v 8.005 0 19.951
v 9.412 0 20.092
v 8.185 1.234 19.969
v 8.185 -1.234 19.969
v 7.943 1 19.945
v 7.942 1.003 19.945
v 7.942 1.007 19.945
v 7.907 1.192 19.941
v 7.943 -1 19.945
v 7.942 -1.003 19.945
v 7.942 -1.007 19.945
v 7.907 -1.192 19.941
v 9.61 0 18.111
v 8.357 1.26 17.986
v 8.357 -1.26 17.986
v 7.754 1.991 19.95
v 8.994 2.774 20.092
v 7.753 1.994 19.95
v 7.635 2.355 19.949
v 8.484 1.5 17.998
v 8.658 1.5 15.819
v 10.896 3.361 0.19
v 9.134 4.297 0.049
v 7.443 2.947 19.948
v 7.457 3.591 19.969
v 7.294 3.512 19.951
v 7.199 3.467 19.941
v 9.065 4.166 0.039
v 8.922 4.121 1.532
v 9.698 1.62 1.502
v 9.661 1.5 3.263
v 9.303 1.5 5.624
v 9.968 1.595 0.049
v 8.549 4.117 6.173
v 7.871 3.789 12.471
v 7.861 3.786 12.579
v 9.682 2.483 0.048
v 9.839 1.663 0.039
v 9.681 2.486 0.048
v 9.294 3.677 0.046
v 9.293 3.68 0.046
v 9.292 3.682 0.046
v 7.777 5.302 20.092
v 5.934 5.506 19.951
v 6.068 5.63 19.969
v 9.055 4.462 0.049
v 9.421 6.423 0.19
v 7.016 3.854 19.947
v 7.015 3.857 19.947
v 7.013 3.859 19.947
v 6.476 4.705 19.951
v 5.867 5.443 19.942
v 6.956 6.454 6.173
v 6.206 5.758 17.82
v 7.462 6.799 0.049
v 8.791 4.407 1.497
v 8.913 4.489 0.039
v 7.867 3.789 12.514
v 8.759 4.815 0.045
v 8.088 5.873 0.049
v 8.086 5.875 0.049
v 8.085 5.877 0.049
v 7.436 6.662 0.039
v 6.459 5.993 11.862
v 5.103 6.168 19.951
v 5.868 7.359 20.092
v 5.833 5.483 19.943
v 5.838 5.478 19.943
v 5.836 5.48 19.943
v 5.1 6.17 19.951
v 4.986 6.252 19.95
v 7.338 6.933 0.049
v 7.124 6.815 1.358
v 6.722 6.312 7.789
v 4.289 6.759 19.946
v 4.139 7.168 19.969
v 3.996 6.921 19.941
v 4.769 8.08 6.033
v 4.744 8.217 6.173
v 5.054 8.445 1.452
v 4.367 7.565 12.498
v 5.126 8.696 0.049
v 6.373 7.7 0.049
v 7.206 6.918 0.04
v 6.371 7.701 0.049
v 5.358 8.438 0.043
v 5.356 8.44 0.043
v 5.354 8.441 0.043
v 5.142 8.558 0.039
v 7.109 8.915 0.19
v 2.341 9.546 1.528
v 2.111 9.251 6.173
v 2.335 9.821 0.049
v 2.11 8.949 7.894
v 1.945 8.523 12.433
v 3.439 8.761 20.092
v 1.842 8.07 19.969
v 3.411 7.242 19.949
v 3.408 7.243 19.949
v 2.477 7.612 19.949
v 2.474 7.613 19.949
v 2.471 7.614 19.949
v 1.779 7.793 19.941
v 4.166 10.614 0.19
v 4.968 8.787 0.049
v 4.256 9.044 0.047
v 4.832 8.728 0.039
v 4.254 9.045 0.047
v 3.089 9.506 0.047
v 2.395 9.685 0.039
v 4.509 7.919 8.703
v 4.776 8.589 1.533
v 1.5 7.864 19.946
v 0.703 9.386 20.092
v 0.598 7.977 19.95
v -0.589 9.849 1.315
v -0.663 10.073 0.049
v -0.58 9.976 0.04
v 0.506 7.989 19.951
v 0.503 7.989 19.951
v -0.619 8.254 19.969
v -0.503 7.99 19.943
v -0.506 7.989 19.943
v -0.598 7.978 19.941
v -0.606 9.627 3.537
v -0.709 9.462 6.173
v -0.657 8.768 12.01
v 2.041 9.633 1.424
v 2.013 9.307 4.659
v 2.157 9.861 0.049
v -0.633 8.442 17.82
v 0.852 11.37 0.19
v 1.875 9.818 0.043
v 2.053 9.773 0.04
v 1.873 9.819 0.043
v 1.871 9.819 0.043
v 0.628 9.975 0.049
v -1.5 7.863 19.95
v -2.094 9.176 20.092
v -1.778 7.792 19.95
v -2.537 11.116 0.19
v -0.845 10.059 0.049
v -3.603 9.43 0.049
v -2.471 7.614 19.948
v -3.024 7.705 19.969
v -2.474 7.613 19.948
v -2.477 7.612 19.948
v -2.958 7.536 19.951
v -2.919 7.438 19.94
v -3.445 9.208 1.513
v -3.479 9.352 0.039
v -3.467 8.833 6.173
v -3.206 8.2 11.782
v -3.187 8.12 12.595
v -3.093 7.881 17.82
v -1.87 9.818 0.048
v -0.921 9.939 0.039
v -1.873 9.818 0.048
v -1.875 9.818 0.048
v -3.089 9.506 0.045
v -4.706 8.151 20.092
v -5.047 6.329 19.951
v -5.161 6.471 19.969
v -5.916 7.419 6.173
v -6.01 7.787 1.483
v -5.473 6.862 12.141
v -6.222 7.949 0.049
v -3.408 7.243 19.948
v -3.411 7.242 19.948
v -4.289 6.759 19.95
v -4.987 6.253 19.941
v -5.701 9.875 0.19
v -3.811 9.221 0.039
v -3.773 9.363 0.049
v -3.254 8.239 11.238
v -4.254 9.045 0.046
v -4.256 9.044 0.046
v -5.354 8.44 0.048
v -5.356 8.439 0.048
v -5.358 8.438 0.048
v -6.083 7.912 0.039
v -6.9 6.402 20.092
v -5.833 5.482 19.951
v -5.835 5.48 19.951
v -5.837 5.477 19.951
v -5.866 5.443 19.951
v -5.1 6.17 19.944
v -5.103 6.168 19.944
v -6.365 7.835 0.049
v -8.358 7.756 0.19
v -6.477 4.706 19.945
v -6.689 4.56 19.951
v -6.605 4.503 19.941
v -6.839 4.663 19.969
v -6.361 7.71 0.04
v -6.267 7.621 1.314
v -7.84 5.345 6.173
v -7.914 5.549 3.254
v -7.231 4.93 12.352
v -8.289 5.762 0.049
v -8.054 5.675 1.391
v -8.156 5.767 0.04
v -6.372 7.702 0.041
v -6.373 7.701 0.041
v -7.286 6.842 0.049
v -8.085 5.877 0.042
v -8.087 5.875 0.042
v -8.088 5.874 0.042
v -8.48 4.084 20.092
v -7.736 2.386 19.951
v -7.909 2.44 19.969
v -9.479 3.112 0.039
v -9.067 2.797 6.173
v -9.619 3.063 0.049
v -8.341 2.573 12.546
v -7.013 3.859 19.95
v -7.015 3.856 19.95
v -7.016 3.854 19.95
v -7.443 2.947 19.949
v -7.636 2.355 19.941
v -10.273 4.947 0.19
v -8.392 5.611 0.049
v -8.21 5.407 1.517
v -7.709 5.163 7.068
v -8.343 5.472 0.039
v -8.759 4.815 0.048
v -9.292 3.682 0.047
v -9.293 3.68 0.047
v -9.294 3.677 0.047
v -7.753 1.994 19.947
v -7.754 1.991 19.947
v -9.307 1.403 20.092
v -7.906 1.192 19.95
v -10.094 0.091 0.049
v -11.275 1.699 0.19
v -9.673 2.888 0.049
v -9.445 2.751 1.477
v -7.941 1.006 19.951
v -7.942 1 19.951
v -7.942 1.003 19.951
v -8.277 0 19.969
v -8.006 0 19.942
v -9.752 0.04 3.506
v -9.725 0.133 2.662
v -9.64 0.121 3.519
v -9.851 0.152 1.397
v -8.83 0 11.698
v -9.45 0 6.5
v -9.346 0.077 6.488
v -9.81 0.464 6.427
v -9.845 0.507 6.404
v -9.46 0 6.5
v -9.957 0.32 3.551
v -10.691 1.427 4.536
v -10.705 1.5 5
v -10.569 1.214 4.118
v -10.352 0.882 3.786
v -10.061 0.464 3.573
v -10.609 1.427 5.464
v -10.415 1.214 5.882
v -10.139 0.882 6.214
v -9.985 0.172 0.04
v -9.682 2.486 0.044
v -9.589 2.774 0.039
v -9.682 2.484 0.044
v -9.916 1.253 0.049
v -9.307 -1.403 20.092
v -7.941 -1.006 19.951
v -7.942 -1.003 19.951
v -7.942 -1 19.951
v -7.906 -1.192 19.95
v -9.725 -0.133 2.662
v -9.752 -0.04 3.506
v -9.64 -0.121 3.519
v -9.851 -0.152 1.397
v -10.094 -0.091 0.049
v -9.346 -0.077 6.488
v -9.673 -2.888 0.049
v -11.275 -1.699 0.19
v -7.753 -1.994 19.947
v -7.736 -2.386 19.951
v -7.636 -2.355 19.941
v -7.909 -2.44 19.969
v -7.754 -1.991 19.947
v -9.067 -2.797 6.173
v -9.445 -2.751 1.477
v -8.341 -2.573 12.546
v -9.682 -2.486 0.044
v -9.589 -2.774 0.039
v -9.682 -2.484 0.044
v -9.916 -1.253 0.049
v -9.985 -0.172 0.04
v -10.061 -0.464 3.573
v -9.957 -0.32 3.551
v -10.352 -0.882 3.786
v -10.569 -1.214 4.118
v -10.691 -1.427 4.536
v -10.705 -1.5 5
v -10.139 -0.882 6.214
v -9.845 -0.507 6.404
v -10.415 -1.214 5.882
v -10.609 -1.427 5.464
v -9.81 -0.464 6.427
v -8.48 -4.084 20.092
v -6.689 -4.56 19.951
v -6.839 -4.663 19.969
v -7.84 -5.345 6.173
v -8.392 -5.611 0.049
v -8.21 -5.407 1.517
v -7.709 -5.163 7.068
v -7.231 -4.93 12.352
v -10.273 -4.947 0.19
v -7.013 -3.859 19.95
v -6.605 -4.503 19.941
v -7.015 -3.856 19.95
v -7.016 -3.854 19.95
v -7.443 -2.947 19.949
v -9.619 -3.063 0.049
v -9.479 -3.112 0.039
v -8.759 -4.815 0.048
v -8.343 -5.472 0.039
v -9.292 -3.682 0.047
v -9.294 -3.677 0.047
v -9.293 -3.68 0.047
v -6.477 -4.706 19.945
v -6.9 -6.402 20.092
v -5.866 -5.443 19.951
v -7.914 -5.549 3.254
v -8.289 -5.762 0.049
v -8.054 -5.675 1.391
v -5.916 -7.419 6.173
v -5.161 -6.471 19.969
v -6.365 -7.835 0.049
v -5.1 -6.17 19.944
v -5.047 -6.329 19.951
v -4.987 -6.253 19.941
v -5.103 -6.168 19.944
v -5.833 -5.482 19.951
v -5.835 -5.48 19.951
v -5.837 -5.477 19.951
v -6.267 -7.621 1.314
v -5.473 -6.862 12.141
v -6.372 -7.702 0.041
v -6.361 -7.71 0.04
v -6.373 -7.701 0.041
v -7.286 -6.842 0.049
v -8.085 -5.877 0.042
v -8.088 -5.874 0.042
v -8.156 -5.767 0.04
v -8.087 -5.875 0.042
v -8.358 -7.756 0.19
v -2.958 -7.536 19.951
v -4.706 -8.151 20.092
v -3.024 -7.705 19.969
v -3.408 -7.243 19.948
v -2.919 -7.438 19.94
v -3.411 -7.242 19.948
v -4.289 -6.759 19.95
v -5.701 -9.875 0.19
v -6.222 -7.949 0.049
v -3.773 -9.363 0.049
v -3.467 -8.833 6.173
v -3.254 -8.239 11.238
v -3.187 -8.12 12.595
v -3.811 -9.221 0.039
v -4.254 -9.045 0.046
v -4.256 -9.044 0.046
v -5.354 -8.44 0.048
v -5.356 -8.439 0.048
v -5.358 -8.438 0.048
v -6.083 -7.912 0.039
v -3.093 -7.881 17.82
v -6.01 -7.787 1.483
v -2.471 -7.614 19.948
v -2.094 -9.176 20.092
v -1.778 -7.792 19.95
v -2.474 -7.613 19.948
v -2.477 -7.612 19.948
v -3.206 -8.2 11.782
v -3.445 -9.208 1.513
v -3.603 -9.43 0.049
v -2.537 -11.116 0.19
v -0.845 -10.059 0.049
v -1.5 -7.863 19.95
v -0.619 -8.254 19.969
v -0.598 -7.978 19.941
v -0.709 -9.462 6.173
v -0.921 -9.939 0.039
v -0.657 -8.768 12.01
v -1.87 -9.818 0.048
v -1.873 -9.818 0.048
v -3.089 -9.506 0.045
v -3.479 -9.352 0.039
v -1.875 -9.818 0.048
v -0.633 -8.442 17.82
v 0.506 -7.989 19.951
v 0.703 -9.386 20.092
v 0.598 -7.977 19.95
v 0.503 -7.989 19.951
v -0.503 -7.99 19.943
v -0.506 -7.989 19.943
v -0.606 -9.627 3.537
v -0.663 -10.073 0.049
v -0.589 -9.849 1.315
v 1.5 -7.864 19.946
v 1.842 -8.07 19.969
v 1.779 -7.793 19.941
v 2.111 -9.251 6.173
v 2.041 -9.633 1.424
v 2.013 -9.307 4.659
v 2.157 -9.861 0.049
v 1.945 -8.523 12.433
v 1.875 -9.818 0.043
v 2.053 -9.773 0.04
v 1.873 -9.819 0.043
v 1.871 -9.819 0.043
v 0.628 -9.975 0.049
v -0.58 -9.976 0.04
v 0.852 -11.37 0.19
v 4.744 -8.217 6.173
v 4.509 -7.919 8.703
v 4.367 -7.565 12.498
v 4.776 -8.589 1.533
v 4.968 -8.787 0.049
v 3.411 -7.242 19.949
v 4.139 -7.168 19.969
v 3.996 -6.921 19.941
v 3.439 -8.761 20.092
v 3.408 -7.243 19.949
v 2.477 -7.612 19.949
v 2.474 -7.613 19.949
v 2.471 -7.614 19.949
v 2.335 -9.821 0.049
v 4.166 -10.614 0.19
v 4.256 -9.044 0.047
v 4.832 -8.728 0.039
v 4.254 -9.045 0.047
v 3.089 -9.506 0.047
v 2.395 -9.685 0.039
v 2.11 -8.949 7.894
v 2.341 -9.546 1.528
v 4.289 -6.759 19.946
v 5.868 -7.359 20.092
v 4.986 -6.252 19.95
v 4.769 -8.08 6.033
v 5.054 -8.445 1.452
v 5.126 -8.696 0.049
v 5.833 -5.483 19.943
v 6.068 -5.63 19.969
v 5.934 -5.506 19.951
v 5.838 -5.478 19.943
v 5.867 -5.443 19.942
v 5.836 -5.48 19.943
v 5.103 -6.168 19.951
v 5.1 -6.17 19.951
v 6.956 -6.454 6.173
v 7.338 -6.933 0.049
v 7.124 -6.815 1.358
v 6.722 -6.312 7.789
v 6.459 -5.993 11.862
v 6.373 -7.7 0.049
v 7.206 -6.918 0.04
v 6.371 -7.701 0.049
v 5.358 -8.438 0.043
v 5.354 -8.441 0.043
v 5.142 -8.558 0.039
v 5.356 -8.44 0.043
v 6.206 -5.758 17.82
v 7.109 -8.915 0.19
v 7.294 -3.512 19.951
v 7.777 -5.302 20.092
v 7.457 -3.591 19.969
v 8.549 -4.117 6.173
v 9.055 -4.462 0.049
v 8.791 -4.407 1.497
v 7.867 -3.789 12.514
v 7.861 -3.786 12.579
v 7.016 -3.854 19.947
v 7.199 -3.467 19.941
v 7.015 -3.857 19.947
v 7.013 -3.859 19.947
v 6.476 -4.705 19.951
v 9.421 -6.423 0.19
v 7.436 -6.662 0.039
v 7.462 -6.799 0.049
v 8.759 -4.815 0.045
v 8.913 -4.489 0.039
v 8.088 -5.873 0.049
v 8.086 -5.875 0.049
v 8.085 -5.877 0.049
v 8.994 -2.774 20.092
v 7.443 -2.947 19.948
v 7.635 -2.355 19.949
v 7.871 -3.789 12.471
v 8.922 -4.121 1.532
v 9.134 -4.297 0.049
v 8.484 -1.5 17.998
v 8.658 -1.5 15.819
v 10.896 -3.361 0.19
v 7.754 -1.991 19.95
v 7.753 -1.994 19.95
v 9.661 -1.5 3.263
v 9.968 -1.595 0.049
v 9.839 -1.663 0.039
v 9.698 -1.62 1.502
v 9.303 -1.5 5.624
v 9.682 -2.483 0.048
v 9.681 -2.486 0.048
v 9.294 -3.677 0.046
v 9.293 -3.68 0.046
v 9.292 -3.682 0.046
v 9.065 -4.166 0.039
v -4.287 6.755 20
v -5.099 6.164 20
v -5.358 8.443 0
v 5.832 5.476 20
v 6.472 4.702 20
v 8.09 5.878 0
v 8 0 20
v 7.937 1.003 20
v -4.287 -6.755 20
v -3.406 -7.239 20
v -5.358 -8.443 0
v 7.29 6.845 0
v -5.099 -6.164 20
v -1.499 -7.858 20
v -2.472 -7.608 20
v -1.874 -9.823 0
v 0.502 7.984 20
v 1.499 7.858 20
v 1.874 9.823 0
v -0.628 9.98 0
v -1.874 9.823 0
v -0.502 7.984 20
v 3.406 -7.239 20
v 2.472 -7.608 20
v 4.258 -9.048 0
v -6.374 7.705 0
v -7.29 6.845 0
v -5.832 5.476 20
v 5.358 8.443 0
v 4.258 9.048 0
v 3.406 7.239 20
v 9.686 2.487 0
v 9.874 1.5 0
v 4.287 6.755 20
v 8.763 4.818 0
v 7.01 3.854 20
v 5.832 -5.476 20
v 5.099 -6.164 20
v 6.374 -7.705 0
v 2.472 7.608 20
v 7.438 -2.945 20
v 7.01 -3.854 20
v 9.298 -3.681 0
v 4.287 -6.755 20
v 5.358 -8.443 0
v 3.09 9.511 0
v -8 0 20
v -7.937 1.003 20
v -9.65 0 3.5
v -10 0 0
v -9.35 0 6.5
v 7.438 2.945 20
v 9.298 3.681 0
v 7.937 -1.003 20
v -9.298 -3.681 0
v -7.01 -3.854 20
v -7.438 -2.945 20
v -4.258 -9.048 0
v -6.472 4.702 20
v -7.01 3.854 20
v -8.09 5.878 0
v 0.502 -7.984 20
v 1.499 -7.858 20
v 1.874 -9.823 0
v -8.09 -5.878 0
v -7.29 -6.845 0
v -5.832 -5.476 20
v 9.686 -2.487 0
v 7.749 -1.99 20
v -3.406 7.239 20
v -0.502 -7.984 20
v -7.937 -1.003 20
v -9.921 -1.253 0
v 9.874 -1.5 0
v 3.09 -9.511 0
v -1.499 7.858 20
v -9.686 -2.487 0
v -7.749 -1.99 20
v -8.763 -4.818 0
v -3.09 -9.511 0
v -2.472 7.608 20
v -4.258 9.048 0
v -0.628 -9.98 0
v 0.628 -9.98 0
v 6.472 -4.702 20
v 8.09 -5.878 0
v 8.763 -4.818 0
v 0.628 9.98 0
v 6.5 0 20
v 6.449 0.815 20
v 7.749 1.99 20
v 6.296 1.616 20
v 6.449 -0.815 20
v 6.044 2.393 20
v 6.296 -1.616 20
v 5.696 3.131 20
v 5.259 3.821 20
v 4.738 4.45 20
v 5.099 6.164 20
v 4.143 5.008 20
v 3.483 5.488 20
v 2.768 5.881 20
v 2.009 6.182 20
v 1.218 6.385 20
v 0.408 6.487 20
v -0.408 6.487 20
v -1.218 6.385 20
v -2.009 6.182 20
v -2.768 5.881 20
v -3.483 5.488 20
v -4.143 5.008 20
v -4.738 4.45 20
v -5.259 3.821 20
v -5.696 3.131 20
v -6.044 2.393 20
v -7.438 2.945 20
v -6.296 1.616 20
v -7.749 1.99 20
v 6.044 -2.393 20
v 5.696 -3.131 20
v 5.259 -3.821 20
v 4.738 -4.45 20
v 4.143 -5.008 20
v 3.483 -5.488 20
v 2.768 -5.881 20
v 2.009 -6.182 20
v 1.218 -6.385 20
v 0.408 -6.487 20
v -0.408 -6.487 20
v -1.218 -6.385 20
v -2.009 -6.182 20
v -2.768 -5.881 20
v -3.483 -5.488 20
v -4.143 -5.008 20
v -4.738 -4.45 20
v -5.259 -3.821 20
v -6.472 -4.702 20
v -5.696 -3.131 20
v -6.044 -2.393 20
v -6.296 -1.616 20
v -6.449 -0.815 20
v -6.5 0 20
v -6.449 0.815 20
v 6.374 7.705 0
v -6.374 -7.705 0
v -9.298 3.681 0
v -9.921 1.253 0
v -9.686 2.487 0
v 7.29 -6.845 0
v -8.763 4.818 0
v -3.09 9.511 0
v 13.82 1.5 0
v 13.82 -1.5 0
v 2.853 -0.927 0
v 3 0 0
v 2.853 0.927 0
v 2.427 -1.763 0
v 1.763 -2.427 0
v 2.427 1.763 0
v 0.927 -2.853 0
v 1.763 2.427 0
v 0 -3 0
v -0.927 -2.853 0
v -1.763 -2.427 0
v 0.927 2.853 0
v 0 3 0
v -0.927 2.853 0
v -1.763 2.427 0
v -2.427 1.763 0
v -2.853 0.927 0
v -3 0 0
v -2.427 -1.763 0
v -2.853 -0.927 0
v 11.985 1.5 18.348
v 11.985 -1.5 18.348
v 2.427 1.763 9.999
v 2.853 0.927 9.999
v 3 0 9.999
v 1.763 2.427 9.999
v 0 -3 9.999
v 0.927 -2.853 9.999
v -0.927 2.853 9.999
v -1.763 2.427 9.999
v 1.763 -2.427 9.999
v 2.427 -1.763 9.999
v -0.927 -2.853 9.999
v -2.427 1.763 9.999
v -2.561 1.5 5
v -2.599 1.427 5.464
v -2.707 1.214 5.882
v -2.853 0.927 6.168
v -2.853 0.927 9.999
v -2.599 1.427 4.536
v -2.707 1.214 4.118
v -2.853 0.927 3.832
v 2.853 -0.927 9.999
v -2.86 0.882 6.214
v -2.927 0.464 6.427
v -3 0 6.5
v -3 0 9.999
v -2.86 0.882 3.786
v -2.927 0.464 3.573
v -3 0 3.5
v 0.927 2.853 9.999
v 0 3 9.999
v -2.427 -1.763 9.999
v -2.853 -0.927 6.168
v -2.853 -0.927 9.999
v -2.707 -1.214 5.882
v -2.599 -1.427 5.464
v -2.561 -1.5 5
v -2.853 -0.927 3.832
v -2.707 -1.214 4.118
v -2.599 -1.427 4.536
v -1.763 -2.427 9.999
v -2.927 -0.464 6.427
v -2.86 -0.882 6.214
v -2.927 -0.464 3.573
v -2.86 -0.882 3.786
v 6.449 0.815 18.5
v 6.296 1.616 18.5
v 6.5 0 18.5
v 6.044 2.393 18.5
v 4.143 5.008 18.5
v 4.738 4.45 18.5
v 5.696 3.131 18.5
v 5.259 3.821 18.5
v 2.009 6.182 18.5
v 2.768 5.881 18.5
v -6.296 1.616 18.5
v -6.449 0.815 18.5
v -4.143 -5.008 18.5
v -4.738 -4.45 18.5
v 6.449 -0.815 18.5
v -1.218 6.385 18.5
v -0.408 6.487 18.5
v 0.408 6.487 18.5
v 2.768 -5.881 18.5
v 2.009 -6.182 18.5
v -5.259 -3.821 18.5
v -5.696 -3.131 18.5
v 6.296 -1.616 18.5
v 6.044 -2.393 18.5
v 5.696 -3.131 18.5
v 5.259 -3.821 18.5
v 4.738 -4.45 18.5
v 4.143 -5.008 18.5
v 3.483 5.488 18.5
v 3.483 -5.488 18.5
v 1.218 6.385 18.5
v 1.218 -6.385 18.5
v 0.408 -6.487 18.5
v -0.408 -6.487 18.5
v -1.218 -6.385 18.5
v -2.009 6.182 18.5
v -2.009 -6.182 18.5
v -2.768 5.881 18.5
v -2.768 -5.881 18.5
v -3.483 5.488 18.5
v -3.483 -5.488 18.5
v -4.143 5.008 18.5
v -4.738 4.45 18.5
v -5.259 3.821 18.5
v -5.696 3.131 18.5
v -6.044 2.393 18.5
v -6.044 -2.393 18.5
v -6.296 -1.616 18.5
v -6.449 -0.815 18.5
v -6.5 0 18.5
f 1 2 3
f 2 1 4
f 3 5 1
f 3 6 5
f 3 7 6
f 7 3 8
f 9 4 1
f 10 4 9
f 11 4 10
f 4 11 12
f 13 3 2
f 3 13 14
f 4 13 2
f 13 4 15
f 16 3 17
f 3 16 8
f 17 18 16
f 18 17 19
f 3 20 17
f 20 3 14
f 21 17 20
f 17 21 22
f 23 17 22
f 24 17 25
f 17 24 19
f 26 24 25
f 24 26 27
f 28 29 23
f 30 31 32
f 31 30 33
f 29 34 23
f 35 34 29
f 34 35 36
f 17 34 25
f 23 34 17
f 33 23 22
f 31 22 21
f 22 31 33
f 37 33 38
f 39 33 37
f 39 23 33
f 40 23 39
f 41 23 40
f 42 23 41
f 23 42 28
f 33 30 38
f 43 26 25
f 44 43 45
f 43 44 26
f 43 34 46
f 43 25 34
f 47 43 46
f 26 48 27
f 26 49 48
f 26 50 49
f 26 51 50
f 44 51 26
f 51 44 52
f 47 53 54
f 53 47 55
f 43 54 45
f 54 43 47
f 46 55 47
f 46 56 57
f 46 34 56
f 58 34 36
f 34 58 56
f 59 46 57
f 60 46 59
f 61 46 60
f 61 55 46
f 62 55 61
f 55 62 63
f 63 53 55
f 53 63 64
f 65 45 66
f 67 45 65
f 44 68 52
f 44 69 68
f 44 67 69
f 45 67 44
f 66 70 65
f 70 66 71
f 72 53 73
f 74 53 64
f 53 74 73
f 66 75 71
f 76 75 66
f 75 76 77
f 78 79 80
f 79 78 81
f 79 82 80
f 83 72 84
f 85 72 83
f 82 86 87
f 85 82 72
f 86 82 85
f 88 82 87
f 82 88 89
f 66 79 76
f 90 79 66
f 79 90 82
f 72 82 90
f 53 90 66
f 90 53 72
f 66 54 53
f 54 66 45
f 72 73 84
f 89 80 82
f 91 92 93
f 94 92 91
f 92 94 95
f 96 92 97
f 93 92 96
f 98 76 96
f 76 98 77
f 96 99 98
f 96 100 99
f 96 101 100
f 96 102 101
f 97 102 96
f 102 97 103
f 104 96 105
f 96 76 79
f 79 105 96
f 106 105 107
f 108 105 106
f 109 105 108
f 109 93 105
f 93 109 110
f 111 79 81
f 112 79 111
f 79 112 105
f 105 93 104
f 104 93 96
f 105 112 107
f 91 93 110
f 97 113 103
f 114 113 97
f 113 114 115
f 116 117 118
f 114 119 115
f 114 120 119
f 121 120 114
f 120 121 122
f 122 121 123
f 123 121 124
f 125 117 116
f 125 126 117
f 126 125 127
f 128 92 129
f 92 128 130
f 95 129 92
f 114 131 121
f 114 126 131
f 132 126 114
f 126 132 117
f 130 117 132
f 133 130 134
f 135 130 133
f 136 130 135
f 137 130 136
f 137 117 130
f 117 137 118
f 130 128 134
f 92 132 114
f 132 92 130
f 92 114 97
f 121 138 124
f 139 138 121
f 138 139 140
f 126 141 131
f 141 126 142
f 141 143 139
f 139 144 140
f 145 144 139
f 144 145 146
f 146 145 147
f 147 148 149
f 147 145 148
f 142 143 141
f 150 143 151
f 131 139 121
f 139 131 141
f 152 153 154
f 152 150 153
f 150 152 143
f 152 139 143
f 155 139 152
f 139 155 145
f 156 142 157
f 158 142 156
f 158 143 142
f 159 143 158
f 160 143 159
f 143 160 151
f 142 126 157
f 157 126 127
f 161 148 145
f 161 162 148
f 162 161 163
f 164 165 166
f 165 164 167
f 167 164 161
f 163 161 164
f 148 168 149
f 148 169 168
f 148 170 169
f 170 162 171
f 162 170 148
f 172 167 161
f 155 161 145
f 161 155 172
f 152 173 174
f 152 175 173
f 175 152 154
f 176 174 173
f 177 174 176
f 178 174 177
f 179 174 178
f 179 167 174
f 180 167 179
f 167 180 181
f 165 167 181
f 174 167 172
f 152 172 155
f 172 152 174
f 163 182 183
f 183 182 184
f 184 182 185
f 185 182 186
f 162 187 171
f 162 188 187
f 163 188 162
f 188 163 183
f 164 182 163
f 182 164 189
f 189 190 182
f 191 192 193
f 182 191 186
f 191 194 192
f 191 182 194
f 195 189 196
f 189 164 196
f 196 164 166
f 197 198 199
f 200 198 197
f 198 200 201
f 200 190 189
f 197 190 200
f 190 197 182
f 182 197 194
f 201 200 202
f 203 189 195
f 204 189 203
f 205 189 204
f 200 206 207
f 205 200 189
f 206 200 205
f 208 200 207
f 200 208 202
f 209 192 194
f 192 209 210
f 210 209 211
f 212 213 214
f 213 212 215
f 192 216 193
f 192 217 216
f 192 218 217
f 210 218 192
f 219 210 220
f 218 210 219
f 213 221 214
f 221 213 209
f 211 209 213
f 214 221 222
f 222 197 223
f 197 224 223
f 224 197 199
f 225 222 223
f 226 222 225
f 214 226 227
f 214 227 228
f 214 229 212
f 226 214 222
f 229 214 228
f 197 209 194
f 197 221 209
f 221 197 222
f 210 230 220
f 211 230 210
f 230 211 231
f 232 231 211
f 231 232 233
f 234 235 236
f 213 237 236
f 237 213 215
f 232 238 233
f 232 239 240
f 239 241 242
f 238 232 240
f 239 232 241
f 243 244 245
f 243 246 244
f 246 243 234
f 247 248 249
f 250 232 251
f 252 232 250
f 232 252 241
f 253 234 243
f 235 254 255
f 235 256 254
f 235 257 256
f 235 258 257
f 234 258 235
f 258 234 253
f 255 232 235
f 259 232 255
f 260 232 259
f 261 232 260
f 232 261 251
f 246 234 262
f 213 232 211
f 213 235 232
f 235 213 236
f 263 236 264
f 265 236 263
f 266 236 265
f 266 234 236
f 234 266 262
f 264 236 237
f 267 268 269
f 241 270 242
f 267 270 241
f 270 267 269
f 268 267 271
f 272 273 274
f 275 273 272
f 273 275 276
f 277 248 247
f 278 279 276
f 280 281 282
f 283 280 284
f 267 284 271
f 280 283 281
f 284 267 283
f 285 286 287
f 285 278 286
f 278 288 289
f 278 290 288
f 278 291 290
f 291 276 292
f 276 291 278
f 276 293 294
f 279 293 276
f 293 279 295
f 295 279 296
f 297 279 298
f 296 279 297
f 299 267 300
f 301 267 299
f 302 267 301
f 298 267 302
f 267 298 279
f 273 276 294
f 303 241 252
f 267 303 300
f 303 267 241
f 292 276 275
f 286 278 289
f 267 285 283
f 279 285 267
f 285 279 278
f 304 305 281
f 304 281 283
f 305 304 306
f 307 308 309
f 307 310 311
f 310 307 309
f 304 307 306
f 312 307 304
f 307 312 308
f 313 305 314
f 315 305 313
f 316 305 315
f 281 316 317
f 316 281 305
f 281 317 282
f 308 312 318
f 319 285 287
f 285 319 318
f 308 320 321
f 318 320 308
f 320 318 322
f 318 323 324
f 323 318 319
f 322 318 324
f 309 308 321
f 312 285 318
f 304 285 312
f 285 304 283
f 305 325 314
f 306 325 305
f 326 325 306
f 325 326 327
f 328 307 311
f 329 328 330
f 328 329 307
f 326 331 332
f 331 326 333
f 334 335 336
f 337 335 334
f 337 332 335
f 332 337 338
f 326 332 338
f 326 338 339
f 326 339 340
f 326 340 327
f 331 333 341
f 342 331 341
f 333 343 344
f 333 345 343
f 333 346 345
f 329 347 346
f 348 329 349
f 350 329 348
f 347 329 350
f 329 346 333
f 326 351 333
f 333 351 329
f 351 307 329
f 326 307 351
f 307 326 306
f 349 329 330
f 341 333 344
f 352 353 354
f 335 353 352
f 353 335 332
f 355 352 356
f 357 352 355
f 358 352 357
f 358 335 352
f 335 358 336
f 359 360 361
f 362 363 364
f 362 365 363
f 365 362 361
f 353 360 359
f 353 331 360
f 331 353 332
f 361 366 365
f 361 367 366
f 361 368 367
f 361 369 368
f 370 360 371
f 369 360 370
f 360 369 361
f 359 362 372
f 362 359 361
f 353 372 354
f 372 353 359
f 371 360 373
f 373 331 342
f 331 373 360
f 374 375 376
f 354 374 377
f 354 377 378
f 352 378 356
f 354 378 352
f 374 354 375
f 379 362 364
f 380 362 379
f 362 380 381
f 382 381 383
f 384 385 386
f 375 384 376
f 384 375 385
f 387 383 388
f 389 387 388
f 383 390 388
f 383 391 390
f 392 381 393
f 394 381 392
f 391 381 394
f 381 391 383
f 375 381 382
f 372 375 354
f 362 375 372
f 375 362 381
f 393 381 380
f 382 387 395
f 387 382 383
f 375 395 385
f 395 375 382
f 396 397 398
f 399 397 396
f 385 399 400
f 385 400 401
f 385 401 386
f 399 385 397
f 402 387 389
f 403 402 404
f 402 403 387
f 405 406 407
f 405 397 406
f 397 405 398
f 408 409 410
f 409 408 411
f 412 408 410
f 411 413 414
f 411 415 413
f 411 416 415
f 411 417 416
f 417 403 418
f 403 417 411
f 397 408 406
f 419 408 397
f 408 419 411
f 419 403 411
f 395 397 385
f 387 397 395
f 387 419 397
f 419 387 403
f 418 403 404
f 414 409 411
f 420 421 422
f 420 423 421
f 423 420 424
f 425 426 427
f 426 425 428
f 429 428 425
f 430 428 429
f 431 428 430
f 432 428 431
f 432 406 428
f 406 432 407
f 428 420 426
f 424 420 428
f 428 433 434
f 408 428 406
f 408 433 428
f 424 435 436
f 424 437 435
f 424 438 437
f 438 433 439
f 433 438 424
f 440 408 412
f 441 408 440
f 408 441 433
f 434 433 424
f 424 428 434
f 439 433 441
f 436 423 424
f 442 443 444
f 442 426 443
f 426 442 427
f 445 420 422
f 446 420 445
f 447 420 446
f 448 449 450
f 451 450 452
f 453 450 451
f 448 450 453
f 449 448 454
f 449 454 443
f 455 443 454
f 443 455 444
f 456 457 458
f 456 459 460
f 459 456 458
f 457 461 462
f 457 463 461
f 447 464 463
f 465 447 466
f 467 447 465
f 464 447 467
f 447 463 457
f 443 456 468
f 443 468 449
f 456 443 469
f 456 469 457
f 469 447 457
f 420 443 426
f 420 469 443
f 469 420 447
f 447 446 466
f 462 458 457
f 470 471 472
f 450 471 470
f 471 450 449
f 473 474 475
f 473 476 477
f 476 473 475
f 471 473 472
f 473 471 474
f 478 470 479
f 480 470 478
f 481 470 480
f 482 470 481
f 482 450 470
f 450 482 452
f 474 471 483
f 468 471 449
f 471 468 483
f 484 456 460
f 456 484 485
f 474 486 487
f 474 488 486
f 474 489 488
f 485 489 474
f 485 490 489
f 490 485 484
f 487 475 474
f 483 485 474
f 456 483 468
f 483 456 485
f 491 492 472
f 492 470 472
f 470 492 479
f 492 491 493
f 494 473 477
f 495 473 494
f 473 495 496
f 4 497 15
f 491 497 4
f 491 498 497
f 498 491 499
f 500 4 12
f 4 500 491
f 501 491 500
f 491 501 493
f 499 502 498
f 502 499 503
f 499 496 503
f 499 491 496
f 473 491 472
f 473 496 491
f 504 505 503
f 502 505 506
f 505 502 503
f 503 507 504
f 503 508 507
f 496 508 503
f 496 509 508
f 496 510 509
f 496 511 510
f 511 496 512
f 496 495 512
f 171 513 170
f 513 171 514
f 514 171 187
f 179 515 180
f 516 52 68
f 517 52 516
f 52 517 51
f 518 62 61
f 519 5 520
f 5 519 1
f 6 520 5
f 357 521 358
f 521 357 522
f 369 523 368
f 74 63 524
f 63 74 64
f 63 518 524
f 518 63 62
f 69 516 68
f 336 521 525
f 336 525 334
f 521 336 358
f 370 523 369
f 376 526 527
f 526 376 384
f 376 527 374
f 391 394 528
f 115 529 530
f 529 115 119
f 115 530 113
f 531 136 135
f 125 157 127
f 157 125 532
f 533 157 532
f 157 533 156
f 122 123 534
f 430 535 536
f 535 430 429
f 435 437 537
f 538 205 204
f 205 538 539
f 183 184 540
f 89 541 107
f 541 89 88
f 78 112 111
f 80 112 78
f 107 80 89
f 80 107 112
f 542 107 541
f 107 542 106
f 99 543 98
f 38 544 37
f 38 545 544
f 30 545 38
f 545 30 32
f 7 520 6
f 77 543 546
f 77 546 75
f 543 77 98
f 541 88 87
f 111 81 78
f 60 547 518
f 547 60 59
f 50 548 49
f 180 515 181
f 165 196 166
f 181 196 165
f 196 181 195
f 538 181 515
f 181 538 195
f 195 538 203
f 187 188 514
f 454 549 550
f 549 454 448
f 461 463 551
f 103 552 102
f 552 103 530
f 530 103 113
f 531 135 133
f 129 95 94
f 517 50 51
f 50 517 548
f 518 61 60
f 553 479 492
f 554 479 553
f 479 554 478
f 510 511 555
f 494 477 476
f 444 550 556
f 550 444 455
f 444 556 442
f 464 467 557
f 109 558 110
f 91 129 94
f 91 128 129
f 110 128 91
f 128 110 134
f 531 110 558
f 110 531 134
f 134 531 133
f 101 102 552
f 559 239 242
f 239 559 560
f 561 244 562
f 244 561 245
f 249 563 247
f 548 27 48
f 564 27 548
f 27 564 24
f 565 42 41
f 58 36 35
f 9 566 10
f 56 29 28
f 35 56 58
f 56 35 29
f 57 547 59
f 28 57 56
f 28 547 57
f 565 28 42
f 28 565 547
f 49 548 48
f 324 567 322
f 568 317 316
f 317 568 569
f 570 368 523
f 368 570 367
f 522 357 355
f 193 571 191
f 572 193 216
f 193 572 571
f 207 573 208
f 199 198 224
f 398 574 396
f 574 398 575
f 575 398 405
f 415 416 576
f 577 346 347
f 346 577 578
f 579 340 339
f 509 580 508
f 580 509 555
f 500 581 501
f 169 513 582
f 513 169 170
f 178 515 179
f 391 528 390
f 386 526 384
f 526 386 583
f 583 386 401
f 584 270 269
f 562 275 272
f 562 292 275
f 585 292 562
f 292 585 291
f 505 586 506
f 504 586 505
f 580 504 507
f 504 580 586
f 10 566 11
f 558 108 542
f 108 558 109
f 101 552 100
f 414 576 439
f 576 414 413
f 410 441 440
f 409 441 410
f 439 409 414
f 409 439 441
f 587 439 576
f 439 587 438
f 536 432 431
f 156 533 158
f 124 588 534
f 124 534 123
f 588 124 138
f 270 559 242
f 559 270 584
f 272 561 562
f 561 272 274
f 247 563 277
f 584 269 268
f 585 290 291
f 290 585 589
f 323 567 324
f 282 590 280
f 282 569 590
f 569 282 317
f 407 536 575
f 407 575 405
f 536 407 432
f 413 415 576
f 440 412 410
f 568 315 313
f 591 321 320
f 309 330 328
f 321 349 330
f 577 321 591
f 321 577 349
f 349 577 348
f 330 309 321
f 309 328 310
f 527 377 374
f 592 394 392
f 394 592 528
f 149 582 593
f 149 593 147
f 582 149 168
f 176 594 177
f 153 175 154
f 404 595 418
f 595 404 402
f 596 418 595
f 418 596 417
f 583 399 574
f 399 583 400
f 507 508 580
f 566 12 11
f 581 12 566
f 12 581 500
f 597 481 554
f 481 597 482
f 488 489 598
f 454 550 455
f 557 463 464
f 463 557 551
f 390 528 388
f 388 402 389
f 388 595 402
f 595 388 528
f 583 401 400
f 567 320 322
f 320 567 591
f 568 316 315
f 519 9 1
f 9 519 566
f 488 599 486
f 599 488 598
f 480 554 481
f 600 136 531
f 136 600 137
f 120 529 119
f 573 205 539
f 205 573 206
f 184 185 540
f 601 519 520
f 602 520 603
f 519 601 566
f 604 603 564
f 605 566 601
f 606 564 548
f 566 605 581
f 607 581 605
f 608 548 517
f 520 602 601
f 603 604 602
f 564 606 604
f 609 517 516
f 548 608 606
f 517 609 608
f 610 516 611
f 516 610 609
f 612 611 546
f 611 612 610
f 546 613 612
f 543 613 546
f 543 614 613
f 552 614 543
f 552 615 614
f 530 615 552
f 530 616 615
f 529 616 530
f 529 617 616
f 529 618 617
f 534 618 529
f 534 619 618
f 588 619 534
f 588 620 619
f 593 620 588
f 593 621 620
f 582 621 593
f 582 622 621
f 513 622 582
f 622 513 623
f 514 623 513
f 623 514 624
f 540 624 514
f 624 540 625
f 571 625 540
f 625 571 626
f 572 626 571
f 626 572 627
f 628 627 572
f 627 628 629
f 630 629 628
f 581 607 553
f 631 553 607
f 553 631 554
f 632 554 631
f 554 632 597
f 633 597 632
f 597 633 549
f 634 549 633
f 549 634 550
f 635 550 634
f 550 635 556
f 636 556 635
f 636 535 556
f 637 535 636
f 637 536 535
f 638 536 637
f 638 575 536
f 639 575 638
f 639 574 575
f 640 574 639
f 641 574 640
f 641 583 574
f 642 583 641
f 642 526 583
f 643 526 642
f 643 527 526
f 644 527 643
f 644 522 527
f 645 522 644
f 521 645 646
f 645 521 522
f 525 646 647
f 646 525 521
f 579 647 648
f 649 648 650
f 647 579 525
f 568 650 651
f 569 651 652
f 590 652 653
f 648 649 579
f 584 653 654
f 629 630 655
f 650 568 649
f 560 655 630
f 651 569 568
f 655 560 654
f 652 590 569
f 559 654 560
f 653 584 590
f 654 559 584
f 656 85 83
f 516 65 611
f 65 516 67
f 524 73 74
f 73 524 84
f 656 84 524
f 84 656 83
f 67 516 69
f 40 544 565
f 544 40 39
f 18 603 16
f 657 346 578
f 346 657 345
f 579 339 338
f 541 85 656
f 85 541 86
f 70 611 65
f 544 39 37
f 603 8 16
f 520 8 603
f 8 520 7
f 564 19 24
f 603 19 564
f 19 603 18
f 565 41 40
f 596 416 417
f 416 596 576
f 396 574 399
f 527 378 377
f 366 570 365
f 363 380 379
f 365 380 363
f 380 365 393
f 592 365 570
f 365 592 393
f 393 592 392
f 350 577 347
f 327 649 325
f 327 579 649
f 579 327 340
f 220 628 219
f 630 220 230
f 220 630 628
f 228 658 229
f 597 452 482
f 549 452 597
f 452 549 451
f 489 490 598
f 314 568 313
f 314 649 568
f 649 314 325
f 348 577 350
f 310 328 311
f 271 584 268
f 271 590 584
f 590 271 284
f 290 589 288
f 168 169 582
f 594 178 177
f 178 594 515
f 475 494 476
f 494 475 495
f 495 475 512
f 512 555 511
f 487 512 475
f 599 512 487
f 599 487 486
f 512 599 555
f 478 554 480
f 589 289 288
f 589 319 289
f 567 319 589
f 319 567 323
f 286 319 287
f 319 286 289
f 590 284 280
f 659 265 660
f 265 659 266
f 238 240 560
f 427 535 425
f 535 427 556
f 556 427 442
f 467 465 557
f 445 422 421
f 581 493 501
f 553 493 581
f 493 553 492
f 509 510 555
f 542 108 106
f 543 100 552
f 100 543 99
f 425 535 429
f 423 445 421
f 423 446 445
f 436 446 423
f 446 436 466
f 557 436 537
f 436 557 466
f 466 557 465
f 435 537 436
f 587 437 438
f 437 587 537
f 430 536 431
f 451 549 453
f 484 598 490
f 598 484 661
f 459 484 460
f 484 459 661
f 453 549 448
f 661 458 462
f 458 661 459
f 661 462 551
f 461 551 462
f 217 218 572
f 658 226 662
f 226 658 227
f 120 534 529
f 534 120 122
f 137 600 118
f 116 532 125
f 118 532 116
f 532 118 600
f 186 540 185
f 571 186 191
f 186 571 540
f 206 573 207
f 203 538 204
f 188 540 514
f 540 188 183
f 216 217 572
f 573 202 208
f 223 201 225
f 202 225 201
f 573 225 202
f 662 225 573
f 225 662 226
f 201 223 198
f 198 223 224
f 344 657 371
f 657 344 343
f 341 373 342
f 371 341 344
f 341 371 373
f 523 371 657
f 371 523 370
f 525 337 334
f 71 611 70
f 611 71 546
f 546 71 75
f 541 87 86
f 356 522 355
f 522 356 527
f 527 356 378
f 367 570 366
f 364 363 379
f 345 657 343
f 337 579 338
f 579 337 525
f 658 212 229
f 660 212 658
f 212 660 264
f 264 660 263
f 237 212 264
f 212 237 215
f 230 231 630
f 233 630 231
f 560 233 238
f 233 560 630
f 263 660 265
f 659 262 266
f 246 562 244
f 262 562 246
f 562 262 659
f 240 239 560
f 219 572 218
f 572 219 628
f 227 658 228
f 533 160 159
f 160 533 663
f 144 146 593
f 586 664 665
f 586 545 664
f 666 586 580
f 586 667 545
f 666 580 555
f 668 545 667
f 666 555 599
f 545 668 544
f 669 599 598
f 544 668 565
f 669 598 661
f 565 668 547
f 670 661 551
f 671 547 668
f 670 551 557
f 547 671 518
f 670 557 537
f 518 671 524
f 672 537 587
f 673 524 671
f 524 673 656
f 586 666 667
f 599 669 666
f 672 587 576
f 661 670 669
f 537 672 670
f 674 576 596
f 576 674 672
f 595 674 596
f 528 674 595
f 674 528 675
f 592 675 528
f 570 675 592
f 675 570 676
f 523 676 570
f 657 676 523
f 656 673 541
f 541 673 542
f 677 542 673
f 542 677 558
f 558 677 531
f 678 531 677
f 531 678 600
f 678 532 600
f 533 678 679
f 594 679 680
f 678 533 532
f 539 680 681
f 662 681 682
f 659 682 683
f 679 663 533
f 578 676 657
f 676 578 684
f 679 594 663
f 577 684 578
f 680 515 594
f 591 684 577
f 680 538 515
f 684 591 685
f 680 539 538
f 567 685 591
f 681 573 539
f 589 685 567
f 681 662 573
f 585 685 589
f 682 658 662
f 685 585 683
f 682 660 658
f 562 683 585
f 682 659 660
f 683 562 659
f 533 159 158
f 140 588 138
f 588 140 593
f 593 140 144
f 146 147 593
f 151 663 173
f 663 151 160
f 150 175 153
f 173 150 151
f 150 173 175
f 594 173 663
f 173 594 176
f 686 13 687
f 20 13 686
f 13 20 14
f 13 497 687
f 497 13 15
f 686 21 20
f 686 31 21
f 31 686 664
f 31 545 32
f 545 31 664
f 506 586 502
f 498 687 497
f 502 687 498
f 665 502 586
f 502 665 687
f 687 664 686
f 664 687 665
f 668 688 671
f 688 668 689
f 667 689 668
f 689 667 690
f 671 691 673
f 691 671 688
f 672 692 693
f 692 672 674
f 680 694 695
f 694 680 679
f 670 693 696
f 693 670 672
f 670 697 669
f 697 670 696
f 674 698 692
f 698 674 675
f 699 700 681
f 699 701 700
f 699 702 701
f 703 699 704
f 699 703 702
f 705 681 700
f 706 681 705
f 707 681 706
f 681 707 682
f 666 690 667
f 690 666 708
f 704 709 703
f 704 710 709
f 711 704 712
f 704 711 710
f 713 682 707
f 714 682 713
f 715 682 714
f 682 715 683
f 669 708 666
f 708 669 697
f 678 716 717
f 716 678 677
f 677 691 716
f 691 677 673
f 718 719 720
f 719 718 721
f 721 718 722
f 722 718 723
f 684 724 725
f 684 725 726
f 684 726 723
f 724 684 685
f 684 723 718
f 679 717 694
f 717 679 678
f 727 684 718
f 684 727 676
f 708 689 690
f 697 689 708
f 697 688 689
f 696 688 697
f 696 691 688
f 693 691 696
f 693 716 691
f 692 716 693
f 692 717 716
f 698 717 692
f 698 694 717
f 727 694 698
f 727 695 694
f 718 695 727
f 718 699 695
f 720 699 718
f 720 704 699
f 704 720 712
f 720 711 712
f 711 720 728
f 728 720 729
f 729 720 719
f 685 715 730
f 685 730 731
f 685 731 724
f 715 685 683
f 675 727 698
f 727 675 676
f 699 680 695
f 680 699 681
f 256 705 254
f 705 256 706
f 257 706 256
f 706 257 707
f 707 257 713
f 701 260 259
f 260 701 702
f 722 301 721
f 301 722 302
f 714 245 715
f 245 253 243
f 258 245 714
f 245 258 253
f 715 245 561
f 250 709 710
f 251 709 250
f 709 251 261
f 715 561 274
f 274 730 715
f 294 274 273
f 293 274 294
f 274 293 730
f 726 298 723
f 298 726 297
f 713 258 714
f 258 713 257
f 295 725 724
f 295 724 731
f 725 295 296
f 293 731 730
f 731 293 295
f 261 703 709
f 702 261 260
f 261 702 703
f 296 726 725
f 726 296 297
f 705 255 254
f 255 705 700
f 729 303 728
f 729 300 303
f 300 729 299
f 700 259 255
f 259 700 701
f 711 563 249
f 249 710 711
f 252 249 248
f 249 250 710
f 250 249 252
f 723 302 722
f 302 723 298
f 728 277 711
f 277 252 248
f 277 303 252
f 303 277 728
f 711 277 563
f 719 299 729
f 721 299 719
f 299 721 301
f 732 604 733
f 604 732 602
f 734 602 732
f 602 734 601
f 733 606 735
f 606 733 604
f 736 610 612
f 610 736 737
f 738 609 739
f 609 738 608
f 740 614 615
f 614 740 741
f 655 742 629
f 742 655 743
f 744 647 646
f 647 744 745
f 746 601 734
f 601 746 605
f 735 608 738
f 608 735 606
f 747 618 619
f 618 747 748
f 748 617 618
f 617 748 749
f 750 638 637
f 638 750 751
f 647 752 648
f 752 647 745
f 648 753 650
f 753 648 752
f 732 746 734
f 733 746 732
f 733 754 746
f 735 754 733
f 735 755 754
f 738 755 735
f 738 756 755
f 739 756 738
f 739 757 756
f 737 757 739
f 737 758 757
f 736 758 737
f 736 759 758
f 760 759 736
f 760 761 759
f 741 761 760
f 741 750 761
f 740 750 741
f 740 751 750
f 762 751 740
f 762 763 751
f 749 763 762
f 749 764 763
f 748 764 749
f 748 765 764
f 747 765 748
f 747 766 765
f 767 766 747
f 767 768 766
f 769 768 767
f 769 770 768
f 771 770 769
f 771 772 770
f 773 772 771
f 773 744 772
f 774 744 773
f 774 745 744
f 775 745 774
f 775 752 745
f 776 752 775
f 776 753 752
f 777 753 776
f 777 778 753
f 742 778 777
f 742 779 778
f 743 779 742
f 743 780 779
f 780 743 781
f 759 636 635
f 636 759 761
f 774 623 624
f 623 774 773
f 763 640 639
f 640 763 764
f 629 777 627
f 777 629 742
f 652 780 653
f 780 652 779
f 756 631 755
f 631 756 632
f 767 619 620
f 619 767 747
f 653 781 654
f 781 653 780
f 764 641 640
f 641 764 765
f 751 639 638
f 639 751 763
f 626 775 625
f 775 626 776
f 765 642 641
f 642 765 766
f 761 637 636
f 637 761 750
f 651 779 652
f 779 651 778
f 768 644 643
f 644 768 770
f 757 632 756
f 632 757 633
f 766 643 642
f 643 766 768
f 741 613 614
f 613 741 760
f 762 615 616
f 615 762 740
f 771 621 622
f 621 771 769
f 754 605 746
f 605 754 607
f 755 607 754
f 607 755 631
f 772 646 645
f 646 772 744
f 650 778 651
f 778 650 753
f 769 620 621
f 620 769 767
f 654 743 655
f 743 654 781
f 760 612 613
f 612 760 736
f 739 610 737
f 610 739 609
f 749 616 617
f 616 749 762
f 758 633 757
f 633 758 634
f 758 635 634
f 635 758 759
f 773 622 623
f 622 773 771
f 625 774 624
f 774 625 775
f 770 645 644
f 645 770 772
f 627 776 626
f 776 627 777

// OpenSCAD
//////////////////////////
// Customizable settings
//////////////////////////


// Diameter of the hole on the bottom (in mm).
HoleDiameter = 6;

// Depth of the hole in the bottom (in mm).  If you want the hole to go all the way through then set this to a number larger than the total height of the object.
HoleDepth = 10;

// If you want a D-shaped hole, set this to the thickness of the flat side (in mm).  Larger values for the flat make the hole smaller.
HoleFlatThickness = 0;

// Height (in mm).  If dome cap is selected, it is not included in height.  The shaft length is also not counted.
KnobHeight = 20;

// Diameter of base of round part of knob (in mm).  (Knurled ridges are not included in this measurement.)
KnobDiameter = 20;

// Shape of top of knob.  "Recessed" type can be painted.
CapType = 1;	// [0:Flat, 1:Recessed, 2:Dome]

// Do you want a large timer-knob style pointer?
TimerKnob=0;	// [0:No, 1:Yes]

// Would you like a divot on the top to indicate direction?
Pointer1 = 0;	// [0:No, 1:Yes]

// Would you like a line (pointer) on the front to indicate direction?
Pointer2 = 1;	// [0:No, 1:Yes]

// Do you want finger ridges around the knob?
Knurled = 1;	// [0:No, 1:Yes]

// 0 = A cylindrical knob, any other value will taper the knob.
TaperPercentage = 20;		// [0:0%, 10:10%, 20:20%, 30:30%, 40:40%, 50:50%]

// Width of "dial" ring (in mm).  Set to zero if you don't want the ring.
RingWidth = 0;

// The number of markings on the dial.  Set to zero if you don't want markings.  (RingWidth must be non-zero.)
RingMarkings = 10;

// diameter of the hole for the setscrew (in mm).  If you don't need a hole, set this to zero.
ScrewHoleDiameter = 3;

// Length of the shaft on the bottom of the knob (in mm).  If you don't want a shaft, set this value to zero.
ShaftLength = 0;

// Diameter of the shaft on the bottom of the knob (in mm).  (ShaftLength must be non-zero.)
ShaftDiameter = 10;

// Would you like a notch in the shaft?  It can be used for a press-on type knob (rather than using a setscrew).  (ShaftLength must be non-zero.)
NotchedShaft = 0;	// [0:No, 1:Yes]



//////////////////////////
//Advanced settings
//////////////////////////

RingThickness = 5*1;
DivotDepth = 1.5*1;
MarkingWidth = 1.5*1;
DistanceBetweenKnurls = 3*1;
TimerKnobConst = 1.8*1;



//////////////////////////
//Calculations
//////////////////////////

PI=3.14159265*1;
KnobMajorRadius = KnobDiameter/2;
KnobMinorRadius = KnobDiameter/2 * (1 - TaperPercentage/100);
KnobRadius = KnobMinorRadius + (KnobMajorRadius-KnobMinorRadius)/2;
KnobCircumference = PI*KnobDiameter;
Knurls = round(KnobCircumference/DistanceBetweenKnurls);
Divot=CapType;

TaperAngle=asin(KnobHeight / (sqrt(pow(KnobHeight, 2) +
		pow(KnobMajorRadius-KnobMinorRadius,2)))) - 90;

DivotRadius = KnobMinorRadius*.4;


union()
{
translate([0, 0, (ShaftLength==0)? 0 : ShaftLength-0.001])
difference()
{
union()
{
	// Primary knob cylinder
	cylinder(h=KnobHeight, r1=KnobMajorRadius, r2=KnobMinorRadius,
			$fn=50);
	
	if (Knurled)
		for (i=[0 : Knurls-1])
			rotate([0, 0, i * (360/Knurls)])
				translate([KnobRadius, 0, KnobHeight/2])
					rotate([0, TaperAngle, 0]) rotate([0, 0, 45])
						cube([2, 2, KnobHeight+.001], center=true);

 	if (RingMarkings>0)
		for (i=[0 : RingMarkings-1])
			rotate([0, 0, i * (360/RingMarkings)])
				translate([KnobMajorRadius + RingWidth/2, 0, 1])
					cube([RingWidth*.5, MarkingWidth, 2], center=true);		
	
	if (Pointer2==1)
		translate([KnobRadius, 0, KnobHeight/2-2])
			rotate([0, TaperAngle, 0])
				cube([8, 3, KnobHeight], center=true);		

	if (RingWidth>0)
		translate([0, 0, RingThickness/2])
			cylinder(r1=KnobMajorRadius + RingWidth, r2=KnobMinorRadius,
					h=RingThickness, $fn=50, center=true);

	if (Divot==2)
		translate([0, 0, KnobHeight])
			difference()
			{
				scale([1, 1, 0.5])
					sphere(r=KnobMinorRadius, $fn=50, center=true);

				translate([0, 0, 0-(KnobMinorRadius+.001)])
					cube([KnobMinorRadius*2.5, KnobMinorRadius*2.5,
							KnobMinorRadius*2], center=true);
			}

	if (TimerKnob==1) intersection()
		{
			translate([0, 0, 0-(KnobDiameter*TimerKnobConst) + KnobHeight])
			sphere(r=KnobDiameter*TimerKnobConst, $fn=50, center=true);		
	
			translate([0-(KnobDiameter*TimerKnobConst)*0.1, 0,
					KnobHeight/2])
				scale([1, 0.5, 1])
					cylinder(h=KnobHeight, r=(KnobDiameter*TimerKnobConst) *
							0.8, $fn=3, center=true);
		}
}

// Pointer1: Offset hemispherical divot
if (Pointer1==1)
	translate([KnobMinorRadius*.55, 0, KnobHeight + DivotRadius*.6])
		sphere(r=DivotRadius, $fn=40);

// Divot1: Centered cylynrical divot
if (Divot==1)
	translate([0, 0, KnobHeight])
		cylinder(h=DivotDepth*2, r=KnobMinorRadius-1.5, $fn=50,
				center=true);

if (ShaftLength==0)
{
	// Hole for shaft
	translate([0, 0, HoleDepth/2 - 0.001])
		difference()
		{
			cylinder(r=HoleDiameter/2, h=HoleDepth, $fn=20,
					center=true);
	
			// Flat for D-shaped hole
			translate([(0-HoleDiameter)+HoleFlatThickness, 0, 0])
				cube([HoleDiameter, HoleDiameter, HoleDepth+.001],
						center=true);
		}
	
	// Hole for setscrew
	if (ScrewHoleDiameter>0)
		translate([0 - (KnobMajorRadius+RingWidth+1)/2, 0,
				HoleDepth/2])
			rotate([0, 90, 0])
			cylinder(h=(KnobMajorRadius+RingWidth+1),
					r=ScrewHoleDiameter/2, $fn=20, center=true);
}

// Make sure bottom ends at z=0
translate([0, 0, -10])
	cube([(KnobMajorRadius+RingWidth) * 3,
			(KnobMajorRadius+RingWidth) * 3, 20], center=true);
}

if (ShaftLength>0)
	difference()
	{
		translate([0, 0, ShaftLength/2])
			cylinder(h=ShaftLength, r=ShaftDiameter/2, $fn=20,
					center=true);

		if (NotchedShaft==1)
		{
			cube([HoleDiameter/2, ShaftDiameter*2, ShaftLength],
					center=true);
		}

		// Hole for shaft
		translate([0, 0, HoleDepth/2 - 0.001])
			difference()
			{
				cylinder(r=HoleDiameter/2, h=HoleDepth, $fn=20,
						center=true);
		
				// Flat for D-shaped hole
				translate([(0-HoleDiameter)+HoleFlatThickness, 0, 0])
					cube([HoleDiameter, HoleDiameter, HoleDepth+.001],
							center=true);
			}
		
		// Hole for setscrew
		if (ScrewHoleDiameter>0)
			translate([0 - (KnobMajorRadius+RingWidth+1)/2, 0,
					HoleDepth/2])
				rotate([0, 90, 0])
				cylinder(h=(KnobMajorRadius+RingWidth+1),
						r=ScrewHoleDiameter/2, $fn=20, center=true);
	}
}
